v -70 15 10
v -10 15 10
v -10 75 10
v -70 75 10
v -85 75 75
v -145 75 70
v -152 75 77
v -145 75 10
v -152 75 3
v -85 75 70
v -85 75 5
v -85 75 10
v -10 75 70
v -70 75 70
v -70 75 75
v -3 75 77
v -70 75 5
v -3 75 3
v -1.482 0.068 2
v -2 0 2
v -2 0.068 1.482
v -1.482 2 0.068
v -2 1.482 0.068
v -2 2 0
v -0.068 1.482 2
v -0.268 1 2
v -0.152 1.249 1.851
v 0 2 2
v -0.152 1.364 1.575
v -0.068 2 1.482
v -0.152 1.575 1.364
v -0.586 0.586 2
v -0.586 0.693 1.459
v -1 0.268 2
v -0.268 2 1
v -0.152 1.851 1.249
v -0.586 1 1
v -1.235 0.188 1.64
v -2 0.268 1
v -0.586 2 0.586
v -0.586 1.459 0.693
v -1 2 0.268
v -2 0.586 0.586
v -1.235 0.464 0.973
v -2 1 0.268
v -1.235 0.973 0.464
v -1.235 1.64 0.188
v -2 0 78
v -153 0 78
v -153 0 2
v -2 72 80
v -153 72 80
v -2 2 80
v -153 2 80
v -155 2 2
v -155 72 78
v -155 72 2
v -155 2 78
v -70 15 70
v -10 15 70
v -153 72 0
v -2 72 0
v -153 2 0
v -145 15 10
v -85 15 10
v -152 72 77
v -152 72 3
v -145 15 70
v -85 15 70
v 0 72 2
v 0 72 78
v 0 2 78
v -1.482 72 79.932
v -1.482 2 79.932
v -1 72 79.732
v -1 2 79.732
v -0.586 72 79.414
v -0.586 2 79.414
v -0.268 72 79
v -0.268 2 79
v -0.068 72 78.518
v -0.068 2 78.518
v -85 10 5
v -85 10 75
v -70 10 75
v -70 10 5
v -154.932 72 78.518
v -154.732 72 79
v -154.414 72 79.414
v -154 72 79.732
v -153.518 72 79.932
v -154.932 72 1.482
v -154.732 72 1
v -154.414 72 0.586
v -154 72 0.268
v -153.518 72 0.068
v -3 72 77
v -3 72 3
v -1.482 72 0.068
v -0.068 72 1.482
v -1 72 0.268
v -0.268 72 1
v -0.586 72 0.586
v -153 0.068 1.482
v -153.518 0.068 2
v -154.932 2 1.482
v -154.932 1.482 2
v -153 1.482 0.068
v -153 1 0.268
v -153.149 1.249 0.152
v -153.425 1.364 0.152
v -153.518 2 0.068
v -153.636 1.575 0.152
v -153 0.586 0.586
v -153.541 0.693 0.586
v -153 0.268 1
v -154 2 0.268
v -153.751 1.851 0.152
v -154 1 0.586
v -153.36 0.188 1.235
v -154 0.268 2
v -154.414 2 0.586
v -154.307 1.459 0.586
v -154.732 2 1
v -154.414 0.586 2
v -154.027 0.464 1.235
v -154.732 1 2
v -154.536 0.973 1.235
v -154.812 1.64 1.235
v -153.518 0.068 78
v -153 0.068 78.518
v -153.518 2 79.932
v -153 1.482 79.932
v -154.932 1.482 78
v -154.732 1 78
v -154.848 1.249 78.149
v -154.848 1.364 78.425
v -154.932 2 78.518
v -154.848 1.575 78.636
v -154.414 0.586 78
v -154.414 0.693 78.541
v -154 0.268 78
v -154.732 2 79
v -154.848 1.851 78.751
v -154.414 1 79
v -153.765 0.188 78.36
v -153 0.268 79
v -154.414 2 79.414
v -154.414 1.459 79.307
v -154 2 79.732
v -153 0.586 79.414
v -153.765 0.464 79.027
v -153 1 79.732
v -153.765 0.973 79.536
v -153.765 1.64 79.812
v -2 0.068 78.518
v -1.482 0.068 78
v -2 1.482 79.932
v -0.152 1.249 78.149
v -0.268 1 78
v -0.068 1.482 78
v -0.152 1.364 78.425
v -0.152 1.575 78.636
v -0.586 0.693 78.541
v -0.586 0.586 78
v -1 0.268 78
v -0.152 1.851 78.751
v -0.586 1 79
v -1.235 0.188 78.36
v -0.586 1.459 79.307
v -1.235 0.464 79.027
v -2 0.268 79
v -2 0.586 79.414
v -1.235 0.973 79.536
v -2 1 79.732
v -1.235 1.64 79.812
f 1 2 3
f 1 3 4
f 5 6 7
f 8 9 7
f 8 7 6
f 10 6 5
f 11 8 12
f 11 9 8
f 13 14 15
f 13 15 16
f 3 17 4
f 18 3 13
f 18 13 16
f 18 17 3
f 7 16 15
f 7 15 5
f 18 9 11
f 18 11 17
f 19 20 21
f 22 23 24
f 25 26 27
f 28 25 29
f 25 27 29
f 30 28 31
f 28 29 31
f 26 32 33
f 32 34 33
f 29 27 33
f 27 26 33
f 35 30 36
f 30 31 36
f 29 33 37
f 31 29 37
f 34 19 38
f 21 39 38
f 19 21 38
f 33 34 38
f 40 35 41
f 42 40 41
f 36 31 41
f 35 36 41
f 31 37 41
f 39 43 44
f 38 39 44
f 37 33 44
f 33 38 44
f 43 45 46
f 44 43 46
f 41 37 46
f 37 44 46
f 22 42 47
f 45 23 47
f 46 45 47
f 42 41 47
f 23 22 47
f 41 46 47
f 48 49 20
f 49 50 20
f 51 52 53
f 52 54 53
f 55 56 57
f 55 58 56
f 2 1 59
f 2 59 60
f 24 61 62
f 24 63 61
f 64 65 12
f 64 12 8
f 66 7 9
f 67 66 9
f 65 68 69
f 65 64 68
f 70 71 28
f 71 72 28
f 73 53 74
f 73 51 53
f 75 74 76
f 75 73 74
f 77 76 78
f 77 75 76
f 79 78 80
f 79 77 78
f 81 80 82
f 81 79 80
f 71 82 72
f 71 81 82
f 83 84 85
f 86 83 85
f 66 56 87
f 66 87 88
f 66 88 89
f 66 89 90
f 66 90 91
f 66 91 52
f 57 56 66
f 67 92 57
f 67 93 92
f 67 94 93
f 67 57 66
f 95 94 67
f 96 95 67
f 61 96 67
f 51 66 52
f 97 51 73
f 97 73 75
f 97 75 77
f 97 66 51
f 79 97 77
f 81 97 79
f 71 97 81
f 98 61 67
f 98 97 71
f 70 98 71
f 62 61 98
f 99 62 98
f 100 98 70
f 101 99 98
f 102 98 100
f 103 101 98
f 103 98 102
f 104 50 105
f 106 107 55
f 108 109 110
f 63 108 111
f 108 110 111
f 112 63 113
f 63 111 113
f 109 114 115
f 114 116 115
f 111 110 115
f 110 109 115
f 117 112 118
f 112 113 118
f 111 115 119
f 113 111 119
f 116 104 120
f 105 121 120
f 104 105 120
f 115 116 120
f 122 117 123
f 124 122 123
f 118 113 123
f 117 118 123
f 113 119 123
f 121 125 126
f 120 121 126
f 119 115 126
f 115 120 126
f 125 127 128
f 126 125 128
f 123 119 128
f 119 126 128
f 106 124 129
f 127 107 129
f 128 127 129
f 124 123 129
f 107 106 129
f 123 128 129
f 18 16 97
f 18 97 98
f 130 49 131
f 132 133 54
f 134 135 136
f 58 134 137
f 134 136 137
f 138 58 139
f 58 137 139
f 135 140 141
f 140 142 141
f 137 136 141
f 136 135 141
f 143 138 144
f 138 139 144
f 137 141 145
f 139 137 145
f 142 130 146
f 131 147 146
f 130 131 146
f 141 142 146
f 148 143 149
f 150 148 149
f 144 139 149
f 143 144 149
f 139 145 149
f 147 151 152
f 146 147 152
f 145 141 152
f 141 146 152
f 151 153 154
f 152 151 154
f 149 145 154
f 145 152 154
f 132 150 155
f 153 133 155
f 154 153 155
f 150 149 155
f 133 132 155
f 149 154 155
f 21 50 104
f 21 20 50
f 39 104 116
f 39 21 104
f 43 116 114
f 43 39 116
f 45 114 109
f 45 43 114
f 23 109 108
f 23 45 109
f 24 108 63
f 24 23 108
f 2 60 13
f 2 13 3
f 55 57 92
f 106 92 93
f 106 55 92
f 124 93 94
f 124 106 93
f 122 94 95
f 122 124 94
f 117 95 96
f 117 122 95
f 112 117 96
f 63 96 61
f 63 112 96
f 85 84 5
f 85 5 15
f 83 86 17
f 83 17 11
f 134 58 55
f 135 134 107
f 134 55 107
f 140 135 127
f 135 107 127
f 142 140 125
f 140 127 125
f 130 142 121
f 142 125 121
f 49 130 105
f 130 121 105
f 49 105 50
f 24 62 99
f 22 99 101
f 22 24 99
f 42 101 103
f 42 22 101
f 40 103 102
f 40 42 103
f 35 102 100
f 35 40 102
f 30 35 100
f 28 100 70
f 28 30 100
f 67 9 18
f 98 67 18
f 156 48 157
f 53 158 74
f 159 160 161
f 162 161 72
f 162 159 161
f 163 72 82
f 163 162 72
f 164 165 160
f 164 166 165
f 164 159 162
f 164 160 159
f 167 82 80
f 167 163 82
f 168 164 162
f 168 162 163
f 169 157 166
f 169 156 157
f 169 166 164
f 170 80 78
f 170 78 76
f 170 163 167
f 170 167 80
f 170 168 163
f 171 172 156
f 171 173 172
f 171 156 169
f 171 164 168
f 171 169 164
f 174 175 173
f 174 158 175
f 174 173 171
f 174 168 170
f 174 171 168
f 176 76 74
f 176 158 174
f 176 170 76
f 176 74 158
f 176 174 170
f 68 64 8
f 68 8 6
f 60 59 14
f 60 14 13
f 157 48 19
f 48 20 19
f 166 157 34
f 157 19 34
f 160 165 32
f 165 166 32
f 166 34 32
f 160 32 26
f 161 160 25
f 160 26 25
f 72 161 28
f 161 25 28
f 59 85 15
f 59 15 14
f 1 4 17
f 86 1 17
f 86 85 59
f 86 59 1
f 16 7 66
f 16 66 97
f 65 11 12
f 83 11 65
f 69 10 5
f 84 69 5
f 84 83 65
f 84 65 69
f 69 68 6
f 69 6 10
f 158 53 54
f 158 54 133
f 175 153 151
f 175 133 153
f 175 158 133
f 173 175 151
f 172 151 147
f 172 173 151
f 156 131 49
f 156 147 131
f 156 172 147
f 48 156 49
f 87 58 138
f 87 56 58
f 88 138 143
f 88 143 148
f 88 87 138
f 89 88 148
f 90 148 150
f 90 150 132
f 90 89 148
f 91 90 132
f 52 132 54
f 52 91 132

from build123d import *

# Parameters (mm, degrees)
SKETCH2_W           = 155
SKETCH2_H           = 80
BOSS_EXTRUDE1_DEPTH = 15
SKETCH3_W           = 15
SKETCH3_H           = 70
CUT_EXTRUDE1_DEPTH  = 5
SKETCH4_W           = 155
SKETCH4_H           = 80
BOSS_EXTRUDE3_DEPTH = 60
SKETCH5_W           = 155
SKETCH5_H           = 80
SKETCH5_W_2         = 149
SKETCH5_H_2         = 74
CUT_EXTRUDE2_DEPTH  = 3
FILLET1_R           = 2


with BuildPart() as part:
    # Sketch2 → Boss-Extrude1 (new body)
    with BuildSketch(Plane(origin=(0, 0, 0), x_dir=(1, 0, 0), z_dir=(0, 1, 0))):
        with Locations((-77.5, -40)):
            Rectangle(SKETCH2_W, SKETCH2_H)
    extrude(amount=BOSS_EXTRUDE1_DEPTH)

    # Sketch3 → Cut-Extrude1 (cut)
    with BuildSketch(Plane(origin=(0, 15, 0), x_dir=(1, 0, 0), z_dir=(0, 1, 0))):
        with Locations((-77.5, -40)):
            Rectangle(SKETCH3_W, SKETCH3_H)
    extrude(amount=-CUT_EXTRUDE1_DEPTH, mode=Mode.SUBTRACT)

    # Sketch4 → Boss-Extrude3 (add)
    with BuildSketch(Plane(origin=(0, 15, 0), x_dir=(1, 0, 0), z_dir=(0, 1, 0))):
        with Locations((-77.5, -40)):
            Rectangle(SKETCH4_W, SKETCH4_H)
        Polygon((-145, -10), (-145, -70), (-85, -70), (-85, -75), (-70, -75), (-70, -70), (-10, -70), (-10, -10), (-70, -10), (-70, -5), (-85, -5), (-85, -10), align=None, mode=Mode.SUBTRACT)
    extrude(amount=BOSS_EXTRUDE3_DEPTH)

    # Sketch5 → Cut-Extrude2 (cut)
    with BuildSketch(Plane(origin=(0, 75, 0), x_dir=(1, 0, 0), z_dir=(0, 1, 0))):
        with Locations((-77.5, -40)):
            Rectangle(SKETCH5_W, SKETCH5_H)
        with Locations((-77.5, -40)):
            Rectangle(SKETCH5_W_2, SKETCH5_H_2, mode=Mode.SUBTRACT)
    extrude(amount=-CUT_EXTRUDE2_DEPTH, mode=Mode.SUBTRACT)

    # Fillet1
    fillet1_edges = [part.edges().sort_by_distance(p)[0] for p in [
        (-77.5, 0, 80),
        (-155, 0, 40),
        (-77.5, 0, 0),
        (0, 0, 40),
        (0, 36, 0),
        (0, 36, 80),
        (-155, 36, 0),
        (-155, 36, 80),
    ]]
    fillet(fillet1_edges, radius=FILLET1_R)


solid = part.part
